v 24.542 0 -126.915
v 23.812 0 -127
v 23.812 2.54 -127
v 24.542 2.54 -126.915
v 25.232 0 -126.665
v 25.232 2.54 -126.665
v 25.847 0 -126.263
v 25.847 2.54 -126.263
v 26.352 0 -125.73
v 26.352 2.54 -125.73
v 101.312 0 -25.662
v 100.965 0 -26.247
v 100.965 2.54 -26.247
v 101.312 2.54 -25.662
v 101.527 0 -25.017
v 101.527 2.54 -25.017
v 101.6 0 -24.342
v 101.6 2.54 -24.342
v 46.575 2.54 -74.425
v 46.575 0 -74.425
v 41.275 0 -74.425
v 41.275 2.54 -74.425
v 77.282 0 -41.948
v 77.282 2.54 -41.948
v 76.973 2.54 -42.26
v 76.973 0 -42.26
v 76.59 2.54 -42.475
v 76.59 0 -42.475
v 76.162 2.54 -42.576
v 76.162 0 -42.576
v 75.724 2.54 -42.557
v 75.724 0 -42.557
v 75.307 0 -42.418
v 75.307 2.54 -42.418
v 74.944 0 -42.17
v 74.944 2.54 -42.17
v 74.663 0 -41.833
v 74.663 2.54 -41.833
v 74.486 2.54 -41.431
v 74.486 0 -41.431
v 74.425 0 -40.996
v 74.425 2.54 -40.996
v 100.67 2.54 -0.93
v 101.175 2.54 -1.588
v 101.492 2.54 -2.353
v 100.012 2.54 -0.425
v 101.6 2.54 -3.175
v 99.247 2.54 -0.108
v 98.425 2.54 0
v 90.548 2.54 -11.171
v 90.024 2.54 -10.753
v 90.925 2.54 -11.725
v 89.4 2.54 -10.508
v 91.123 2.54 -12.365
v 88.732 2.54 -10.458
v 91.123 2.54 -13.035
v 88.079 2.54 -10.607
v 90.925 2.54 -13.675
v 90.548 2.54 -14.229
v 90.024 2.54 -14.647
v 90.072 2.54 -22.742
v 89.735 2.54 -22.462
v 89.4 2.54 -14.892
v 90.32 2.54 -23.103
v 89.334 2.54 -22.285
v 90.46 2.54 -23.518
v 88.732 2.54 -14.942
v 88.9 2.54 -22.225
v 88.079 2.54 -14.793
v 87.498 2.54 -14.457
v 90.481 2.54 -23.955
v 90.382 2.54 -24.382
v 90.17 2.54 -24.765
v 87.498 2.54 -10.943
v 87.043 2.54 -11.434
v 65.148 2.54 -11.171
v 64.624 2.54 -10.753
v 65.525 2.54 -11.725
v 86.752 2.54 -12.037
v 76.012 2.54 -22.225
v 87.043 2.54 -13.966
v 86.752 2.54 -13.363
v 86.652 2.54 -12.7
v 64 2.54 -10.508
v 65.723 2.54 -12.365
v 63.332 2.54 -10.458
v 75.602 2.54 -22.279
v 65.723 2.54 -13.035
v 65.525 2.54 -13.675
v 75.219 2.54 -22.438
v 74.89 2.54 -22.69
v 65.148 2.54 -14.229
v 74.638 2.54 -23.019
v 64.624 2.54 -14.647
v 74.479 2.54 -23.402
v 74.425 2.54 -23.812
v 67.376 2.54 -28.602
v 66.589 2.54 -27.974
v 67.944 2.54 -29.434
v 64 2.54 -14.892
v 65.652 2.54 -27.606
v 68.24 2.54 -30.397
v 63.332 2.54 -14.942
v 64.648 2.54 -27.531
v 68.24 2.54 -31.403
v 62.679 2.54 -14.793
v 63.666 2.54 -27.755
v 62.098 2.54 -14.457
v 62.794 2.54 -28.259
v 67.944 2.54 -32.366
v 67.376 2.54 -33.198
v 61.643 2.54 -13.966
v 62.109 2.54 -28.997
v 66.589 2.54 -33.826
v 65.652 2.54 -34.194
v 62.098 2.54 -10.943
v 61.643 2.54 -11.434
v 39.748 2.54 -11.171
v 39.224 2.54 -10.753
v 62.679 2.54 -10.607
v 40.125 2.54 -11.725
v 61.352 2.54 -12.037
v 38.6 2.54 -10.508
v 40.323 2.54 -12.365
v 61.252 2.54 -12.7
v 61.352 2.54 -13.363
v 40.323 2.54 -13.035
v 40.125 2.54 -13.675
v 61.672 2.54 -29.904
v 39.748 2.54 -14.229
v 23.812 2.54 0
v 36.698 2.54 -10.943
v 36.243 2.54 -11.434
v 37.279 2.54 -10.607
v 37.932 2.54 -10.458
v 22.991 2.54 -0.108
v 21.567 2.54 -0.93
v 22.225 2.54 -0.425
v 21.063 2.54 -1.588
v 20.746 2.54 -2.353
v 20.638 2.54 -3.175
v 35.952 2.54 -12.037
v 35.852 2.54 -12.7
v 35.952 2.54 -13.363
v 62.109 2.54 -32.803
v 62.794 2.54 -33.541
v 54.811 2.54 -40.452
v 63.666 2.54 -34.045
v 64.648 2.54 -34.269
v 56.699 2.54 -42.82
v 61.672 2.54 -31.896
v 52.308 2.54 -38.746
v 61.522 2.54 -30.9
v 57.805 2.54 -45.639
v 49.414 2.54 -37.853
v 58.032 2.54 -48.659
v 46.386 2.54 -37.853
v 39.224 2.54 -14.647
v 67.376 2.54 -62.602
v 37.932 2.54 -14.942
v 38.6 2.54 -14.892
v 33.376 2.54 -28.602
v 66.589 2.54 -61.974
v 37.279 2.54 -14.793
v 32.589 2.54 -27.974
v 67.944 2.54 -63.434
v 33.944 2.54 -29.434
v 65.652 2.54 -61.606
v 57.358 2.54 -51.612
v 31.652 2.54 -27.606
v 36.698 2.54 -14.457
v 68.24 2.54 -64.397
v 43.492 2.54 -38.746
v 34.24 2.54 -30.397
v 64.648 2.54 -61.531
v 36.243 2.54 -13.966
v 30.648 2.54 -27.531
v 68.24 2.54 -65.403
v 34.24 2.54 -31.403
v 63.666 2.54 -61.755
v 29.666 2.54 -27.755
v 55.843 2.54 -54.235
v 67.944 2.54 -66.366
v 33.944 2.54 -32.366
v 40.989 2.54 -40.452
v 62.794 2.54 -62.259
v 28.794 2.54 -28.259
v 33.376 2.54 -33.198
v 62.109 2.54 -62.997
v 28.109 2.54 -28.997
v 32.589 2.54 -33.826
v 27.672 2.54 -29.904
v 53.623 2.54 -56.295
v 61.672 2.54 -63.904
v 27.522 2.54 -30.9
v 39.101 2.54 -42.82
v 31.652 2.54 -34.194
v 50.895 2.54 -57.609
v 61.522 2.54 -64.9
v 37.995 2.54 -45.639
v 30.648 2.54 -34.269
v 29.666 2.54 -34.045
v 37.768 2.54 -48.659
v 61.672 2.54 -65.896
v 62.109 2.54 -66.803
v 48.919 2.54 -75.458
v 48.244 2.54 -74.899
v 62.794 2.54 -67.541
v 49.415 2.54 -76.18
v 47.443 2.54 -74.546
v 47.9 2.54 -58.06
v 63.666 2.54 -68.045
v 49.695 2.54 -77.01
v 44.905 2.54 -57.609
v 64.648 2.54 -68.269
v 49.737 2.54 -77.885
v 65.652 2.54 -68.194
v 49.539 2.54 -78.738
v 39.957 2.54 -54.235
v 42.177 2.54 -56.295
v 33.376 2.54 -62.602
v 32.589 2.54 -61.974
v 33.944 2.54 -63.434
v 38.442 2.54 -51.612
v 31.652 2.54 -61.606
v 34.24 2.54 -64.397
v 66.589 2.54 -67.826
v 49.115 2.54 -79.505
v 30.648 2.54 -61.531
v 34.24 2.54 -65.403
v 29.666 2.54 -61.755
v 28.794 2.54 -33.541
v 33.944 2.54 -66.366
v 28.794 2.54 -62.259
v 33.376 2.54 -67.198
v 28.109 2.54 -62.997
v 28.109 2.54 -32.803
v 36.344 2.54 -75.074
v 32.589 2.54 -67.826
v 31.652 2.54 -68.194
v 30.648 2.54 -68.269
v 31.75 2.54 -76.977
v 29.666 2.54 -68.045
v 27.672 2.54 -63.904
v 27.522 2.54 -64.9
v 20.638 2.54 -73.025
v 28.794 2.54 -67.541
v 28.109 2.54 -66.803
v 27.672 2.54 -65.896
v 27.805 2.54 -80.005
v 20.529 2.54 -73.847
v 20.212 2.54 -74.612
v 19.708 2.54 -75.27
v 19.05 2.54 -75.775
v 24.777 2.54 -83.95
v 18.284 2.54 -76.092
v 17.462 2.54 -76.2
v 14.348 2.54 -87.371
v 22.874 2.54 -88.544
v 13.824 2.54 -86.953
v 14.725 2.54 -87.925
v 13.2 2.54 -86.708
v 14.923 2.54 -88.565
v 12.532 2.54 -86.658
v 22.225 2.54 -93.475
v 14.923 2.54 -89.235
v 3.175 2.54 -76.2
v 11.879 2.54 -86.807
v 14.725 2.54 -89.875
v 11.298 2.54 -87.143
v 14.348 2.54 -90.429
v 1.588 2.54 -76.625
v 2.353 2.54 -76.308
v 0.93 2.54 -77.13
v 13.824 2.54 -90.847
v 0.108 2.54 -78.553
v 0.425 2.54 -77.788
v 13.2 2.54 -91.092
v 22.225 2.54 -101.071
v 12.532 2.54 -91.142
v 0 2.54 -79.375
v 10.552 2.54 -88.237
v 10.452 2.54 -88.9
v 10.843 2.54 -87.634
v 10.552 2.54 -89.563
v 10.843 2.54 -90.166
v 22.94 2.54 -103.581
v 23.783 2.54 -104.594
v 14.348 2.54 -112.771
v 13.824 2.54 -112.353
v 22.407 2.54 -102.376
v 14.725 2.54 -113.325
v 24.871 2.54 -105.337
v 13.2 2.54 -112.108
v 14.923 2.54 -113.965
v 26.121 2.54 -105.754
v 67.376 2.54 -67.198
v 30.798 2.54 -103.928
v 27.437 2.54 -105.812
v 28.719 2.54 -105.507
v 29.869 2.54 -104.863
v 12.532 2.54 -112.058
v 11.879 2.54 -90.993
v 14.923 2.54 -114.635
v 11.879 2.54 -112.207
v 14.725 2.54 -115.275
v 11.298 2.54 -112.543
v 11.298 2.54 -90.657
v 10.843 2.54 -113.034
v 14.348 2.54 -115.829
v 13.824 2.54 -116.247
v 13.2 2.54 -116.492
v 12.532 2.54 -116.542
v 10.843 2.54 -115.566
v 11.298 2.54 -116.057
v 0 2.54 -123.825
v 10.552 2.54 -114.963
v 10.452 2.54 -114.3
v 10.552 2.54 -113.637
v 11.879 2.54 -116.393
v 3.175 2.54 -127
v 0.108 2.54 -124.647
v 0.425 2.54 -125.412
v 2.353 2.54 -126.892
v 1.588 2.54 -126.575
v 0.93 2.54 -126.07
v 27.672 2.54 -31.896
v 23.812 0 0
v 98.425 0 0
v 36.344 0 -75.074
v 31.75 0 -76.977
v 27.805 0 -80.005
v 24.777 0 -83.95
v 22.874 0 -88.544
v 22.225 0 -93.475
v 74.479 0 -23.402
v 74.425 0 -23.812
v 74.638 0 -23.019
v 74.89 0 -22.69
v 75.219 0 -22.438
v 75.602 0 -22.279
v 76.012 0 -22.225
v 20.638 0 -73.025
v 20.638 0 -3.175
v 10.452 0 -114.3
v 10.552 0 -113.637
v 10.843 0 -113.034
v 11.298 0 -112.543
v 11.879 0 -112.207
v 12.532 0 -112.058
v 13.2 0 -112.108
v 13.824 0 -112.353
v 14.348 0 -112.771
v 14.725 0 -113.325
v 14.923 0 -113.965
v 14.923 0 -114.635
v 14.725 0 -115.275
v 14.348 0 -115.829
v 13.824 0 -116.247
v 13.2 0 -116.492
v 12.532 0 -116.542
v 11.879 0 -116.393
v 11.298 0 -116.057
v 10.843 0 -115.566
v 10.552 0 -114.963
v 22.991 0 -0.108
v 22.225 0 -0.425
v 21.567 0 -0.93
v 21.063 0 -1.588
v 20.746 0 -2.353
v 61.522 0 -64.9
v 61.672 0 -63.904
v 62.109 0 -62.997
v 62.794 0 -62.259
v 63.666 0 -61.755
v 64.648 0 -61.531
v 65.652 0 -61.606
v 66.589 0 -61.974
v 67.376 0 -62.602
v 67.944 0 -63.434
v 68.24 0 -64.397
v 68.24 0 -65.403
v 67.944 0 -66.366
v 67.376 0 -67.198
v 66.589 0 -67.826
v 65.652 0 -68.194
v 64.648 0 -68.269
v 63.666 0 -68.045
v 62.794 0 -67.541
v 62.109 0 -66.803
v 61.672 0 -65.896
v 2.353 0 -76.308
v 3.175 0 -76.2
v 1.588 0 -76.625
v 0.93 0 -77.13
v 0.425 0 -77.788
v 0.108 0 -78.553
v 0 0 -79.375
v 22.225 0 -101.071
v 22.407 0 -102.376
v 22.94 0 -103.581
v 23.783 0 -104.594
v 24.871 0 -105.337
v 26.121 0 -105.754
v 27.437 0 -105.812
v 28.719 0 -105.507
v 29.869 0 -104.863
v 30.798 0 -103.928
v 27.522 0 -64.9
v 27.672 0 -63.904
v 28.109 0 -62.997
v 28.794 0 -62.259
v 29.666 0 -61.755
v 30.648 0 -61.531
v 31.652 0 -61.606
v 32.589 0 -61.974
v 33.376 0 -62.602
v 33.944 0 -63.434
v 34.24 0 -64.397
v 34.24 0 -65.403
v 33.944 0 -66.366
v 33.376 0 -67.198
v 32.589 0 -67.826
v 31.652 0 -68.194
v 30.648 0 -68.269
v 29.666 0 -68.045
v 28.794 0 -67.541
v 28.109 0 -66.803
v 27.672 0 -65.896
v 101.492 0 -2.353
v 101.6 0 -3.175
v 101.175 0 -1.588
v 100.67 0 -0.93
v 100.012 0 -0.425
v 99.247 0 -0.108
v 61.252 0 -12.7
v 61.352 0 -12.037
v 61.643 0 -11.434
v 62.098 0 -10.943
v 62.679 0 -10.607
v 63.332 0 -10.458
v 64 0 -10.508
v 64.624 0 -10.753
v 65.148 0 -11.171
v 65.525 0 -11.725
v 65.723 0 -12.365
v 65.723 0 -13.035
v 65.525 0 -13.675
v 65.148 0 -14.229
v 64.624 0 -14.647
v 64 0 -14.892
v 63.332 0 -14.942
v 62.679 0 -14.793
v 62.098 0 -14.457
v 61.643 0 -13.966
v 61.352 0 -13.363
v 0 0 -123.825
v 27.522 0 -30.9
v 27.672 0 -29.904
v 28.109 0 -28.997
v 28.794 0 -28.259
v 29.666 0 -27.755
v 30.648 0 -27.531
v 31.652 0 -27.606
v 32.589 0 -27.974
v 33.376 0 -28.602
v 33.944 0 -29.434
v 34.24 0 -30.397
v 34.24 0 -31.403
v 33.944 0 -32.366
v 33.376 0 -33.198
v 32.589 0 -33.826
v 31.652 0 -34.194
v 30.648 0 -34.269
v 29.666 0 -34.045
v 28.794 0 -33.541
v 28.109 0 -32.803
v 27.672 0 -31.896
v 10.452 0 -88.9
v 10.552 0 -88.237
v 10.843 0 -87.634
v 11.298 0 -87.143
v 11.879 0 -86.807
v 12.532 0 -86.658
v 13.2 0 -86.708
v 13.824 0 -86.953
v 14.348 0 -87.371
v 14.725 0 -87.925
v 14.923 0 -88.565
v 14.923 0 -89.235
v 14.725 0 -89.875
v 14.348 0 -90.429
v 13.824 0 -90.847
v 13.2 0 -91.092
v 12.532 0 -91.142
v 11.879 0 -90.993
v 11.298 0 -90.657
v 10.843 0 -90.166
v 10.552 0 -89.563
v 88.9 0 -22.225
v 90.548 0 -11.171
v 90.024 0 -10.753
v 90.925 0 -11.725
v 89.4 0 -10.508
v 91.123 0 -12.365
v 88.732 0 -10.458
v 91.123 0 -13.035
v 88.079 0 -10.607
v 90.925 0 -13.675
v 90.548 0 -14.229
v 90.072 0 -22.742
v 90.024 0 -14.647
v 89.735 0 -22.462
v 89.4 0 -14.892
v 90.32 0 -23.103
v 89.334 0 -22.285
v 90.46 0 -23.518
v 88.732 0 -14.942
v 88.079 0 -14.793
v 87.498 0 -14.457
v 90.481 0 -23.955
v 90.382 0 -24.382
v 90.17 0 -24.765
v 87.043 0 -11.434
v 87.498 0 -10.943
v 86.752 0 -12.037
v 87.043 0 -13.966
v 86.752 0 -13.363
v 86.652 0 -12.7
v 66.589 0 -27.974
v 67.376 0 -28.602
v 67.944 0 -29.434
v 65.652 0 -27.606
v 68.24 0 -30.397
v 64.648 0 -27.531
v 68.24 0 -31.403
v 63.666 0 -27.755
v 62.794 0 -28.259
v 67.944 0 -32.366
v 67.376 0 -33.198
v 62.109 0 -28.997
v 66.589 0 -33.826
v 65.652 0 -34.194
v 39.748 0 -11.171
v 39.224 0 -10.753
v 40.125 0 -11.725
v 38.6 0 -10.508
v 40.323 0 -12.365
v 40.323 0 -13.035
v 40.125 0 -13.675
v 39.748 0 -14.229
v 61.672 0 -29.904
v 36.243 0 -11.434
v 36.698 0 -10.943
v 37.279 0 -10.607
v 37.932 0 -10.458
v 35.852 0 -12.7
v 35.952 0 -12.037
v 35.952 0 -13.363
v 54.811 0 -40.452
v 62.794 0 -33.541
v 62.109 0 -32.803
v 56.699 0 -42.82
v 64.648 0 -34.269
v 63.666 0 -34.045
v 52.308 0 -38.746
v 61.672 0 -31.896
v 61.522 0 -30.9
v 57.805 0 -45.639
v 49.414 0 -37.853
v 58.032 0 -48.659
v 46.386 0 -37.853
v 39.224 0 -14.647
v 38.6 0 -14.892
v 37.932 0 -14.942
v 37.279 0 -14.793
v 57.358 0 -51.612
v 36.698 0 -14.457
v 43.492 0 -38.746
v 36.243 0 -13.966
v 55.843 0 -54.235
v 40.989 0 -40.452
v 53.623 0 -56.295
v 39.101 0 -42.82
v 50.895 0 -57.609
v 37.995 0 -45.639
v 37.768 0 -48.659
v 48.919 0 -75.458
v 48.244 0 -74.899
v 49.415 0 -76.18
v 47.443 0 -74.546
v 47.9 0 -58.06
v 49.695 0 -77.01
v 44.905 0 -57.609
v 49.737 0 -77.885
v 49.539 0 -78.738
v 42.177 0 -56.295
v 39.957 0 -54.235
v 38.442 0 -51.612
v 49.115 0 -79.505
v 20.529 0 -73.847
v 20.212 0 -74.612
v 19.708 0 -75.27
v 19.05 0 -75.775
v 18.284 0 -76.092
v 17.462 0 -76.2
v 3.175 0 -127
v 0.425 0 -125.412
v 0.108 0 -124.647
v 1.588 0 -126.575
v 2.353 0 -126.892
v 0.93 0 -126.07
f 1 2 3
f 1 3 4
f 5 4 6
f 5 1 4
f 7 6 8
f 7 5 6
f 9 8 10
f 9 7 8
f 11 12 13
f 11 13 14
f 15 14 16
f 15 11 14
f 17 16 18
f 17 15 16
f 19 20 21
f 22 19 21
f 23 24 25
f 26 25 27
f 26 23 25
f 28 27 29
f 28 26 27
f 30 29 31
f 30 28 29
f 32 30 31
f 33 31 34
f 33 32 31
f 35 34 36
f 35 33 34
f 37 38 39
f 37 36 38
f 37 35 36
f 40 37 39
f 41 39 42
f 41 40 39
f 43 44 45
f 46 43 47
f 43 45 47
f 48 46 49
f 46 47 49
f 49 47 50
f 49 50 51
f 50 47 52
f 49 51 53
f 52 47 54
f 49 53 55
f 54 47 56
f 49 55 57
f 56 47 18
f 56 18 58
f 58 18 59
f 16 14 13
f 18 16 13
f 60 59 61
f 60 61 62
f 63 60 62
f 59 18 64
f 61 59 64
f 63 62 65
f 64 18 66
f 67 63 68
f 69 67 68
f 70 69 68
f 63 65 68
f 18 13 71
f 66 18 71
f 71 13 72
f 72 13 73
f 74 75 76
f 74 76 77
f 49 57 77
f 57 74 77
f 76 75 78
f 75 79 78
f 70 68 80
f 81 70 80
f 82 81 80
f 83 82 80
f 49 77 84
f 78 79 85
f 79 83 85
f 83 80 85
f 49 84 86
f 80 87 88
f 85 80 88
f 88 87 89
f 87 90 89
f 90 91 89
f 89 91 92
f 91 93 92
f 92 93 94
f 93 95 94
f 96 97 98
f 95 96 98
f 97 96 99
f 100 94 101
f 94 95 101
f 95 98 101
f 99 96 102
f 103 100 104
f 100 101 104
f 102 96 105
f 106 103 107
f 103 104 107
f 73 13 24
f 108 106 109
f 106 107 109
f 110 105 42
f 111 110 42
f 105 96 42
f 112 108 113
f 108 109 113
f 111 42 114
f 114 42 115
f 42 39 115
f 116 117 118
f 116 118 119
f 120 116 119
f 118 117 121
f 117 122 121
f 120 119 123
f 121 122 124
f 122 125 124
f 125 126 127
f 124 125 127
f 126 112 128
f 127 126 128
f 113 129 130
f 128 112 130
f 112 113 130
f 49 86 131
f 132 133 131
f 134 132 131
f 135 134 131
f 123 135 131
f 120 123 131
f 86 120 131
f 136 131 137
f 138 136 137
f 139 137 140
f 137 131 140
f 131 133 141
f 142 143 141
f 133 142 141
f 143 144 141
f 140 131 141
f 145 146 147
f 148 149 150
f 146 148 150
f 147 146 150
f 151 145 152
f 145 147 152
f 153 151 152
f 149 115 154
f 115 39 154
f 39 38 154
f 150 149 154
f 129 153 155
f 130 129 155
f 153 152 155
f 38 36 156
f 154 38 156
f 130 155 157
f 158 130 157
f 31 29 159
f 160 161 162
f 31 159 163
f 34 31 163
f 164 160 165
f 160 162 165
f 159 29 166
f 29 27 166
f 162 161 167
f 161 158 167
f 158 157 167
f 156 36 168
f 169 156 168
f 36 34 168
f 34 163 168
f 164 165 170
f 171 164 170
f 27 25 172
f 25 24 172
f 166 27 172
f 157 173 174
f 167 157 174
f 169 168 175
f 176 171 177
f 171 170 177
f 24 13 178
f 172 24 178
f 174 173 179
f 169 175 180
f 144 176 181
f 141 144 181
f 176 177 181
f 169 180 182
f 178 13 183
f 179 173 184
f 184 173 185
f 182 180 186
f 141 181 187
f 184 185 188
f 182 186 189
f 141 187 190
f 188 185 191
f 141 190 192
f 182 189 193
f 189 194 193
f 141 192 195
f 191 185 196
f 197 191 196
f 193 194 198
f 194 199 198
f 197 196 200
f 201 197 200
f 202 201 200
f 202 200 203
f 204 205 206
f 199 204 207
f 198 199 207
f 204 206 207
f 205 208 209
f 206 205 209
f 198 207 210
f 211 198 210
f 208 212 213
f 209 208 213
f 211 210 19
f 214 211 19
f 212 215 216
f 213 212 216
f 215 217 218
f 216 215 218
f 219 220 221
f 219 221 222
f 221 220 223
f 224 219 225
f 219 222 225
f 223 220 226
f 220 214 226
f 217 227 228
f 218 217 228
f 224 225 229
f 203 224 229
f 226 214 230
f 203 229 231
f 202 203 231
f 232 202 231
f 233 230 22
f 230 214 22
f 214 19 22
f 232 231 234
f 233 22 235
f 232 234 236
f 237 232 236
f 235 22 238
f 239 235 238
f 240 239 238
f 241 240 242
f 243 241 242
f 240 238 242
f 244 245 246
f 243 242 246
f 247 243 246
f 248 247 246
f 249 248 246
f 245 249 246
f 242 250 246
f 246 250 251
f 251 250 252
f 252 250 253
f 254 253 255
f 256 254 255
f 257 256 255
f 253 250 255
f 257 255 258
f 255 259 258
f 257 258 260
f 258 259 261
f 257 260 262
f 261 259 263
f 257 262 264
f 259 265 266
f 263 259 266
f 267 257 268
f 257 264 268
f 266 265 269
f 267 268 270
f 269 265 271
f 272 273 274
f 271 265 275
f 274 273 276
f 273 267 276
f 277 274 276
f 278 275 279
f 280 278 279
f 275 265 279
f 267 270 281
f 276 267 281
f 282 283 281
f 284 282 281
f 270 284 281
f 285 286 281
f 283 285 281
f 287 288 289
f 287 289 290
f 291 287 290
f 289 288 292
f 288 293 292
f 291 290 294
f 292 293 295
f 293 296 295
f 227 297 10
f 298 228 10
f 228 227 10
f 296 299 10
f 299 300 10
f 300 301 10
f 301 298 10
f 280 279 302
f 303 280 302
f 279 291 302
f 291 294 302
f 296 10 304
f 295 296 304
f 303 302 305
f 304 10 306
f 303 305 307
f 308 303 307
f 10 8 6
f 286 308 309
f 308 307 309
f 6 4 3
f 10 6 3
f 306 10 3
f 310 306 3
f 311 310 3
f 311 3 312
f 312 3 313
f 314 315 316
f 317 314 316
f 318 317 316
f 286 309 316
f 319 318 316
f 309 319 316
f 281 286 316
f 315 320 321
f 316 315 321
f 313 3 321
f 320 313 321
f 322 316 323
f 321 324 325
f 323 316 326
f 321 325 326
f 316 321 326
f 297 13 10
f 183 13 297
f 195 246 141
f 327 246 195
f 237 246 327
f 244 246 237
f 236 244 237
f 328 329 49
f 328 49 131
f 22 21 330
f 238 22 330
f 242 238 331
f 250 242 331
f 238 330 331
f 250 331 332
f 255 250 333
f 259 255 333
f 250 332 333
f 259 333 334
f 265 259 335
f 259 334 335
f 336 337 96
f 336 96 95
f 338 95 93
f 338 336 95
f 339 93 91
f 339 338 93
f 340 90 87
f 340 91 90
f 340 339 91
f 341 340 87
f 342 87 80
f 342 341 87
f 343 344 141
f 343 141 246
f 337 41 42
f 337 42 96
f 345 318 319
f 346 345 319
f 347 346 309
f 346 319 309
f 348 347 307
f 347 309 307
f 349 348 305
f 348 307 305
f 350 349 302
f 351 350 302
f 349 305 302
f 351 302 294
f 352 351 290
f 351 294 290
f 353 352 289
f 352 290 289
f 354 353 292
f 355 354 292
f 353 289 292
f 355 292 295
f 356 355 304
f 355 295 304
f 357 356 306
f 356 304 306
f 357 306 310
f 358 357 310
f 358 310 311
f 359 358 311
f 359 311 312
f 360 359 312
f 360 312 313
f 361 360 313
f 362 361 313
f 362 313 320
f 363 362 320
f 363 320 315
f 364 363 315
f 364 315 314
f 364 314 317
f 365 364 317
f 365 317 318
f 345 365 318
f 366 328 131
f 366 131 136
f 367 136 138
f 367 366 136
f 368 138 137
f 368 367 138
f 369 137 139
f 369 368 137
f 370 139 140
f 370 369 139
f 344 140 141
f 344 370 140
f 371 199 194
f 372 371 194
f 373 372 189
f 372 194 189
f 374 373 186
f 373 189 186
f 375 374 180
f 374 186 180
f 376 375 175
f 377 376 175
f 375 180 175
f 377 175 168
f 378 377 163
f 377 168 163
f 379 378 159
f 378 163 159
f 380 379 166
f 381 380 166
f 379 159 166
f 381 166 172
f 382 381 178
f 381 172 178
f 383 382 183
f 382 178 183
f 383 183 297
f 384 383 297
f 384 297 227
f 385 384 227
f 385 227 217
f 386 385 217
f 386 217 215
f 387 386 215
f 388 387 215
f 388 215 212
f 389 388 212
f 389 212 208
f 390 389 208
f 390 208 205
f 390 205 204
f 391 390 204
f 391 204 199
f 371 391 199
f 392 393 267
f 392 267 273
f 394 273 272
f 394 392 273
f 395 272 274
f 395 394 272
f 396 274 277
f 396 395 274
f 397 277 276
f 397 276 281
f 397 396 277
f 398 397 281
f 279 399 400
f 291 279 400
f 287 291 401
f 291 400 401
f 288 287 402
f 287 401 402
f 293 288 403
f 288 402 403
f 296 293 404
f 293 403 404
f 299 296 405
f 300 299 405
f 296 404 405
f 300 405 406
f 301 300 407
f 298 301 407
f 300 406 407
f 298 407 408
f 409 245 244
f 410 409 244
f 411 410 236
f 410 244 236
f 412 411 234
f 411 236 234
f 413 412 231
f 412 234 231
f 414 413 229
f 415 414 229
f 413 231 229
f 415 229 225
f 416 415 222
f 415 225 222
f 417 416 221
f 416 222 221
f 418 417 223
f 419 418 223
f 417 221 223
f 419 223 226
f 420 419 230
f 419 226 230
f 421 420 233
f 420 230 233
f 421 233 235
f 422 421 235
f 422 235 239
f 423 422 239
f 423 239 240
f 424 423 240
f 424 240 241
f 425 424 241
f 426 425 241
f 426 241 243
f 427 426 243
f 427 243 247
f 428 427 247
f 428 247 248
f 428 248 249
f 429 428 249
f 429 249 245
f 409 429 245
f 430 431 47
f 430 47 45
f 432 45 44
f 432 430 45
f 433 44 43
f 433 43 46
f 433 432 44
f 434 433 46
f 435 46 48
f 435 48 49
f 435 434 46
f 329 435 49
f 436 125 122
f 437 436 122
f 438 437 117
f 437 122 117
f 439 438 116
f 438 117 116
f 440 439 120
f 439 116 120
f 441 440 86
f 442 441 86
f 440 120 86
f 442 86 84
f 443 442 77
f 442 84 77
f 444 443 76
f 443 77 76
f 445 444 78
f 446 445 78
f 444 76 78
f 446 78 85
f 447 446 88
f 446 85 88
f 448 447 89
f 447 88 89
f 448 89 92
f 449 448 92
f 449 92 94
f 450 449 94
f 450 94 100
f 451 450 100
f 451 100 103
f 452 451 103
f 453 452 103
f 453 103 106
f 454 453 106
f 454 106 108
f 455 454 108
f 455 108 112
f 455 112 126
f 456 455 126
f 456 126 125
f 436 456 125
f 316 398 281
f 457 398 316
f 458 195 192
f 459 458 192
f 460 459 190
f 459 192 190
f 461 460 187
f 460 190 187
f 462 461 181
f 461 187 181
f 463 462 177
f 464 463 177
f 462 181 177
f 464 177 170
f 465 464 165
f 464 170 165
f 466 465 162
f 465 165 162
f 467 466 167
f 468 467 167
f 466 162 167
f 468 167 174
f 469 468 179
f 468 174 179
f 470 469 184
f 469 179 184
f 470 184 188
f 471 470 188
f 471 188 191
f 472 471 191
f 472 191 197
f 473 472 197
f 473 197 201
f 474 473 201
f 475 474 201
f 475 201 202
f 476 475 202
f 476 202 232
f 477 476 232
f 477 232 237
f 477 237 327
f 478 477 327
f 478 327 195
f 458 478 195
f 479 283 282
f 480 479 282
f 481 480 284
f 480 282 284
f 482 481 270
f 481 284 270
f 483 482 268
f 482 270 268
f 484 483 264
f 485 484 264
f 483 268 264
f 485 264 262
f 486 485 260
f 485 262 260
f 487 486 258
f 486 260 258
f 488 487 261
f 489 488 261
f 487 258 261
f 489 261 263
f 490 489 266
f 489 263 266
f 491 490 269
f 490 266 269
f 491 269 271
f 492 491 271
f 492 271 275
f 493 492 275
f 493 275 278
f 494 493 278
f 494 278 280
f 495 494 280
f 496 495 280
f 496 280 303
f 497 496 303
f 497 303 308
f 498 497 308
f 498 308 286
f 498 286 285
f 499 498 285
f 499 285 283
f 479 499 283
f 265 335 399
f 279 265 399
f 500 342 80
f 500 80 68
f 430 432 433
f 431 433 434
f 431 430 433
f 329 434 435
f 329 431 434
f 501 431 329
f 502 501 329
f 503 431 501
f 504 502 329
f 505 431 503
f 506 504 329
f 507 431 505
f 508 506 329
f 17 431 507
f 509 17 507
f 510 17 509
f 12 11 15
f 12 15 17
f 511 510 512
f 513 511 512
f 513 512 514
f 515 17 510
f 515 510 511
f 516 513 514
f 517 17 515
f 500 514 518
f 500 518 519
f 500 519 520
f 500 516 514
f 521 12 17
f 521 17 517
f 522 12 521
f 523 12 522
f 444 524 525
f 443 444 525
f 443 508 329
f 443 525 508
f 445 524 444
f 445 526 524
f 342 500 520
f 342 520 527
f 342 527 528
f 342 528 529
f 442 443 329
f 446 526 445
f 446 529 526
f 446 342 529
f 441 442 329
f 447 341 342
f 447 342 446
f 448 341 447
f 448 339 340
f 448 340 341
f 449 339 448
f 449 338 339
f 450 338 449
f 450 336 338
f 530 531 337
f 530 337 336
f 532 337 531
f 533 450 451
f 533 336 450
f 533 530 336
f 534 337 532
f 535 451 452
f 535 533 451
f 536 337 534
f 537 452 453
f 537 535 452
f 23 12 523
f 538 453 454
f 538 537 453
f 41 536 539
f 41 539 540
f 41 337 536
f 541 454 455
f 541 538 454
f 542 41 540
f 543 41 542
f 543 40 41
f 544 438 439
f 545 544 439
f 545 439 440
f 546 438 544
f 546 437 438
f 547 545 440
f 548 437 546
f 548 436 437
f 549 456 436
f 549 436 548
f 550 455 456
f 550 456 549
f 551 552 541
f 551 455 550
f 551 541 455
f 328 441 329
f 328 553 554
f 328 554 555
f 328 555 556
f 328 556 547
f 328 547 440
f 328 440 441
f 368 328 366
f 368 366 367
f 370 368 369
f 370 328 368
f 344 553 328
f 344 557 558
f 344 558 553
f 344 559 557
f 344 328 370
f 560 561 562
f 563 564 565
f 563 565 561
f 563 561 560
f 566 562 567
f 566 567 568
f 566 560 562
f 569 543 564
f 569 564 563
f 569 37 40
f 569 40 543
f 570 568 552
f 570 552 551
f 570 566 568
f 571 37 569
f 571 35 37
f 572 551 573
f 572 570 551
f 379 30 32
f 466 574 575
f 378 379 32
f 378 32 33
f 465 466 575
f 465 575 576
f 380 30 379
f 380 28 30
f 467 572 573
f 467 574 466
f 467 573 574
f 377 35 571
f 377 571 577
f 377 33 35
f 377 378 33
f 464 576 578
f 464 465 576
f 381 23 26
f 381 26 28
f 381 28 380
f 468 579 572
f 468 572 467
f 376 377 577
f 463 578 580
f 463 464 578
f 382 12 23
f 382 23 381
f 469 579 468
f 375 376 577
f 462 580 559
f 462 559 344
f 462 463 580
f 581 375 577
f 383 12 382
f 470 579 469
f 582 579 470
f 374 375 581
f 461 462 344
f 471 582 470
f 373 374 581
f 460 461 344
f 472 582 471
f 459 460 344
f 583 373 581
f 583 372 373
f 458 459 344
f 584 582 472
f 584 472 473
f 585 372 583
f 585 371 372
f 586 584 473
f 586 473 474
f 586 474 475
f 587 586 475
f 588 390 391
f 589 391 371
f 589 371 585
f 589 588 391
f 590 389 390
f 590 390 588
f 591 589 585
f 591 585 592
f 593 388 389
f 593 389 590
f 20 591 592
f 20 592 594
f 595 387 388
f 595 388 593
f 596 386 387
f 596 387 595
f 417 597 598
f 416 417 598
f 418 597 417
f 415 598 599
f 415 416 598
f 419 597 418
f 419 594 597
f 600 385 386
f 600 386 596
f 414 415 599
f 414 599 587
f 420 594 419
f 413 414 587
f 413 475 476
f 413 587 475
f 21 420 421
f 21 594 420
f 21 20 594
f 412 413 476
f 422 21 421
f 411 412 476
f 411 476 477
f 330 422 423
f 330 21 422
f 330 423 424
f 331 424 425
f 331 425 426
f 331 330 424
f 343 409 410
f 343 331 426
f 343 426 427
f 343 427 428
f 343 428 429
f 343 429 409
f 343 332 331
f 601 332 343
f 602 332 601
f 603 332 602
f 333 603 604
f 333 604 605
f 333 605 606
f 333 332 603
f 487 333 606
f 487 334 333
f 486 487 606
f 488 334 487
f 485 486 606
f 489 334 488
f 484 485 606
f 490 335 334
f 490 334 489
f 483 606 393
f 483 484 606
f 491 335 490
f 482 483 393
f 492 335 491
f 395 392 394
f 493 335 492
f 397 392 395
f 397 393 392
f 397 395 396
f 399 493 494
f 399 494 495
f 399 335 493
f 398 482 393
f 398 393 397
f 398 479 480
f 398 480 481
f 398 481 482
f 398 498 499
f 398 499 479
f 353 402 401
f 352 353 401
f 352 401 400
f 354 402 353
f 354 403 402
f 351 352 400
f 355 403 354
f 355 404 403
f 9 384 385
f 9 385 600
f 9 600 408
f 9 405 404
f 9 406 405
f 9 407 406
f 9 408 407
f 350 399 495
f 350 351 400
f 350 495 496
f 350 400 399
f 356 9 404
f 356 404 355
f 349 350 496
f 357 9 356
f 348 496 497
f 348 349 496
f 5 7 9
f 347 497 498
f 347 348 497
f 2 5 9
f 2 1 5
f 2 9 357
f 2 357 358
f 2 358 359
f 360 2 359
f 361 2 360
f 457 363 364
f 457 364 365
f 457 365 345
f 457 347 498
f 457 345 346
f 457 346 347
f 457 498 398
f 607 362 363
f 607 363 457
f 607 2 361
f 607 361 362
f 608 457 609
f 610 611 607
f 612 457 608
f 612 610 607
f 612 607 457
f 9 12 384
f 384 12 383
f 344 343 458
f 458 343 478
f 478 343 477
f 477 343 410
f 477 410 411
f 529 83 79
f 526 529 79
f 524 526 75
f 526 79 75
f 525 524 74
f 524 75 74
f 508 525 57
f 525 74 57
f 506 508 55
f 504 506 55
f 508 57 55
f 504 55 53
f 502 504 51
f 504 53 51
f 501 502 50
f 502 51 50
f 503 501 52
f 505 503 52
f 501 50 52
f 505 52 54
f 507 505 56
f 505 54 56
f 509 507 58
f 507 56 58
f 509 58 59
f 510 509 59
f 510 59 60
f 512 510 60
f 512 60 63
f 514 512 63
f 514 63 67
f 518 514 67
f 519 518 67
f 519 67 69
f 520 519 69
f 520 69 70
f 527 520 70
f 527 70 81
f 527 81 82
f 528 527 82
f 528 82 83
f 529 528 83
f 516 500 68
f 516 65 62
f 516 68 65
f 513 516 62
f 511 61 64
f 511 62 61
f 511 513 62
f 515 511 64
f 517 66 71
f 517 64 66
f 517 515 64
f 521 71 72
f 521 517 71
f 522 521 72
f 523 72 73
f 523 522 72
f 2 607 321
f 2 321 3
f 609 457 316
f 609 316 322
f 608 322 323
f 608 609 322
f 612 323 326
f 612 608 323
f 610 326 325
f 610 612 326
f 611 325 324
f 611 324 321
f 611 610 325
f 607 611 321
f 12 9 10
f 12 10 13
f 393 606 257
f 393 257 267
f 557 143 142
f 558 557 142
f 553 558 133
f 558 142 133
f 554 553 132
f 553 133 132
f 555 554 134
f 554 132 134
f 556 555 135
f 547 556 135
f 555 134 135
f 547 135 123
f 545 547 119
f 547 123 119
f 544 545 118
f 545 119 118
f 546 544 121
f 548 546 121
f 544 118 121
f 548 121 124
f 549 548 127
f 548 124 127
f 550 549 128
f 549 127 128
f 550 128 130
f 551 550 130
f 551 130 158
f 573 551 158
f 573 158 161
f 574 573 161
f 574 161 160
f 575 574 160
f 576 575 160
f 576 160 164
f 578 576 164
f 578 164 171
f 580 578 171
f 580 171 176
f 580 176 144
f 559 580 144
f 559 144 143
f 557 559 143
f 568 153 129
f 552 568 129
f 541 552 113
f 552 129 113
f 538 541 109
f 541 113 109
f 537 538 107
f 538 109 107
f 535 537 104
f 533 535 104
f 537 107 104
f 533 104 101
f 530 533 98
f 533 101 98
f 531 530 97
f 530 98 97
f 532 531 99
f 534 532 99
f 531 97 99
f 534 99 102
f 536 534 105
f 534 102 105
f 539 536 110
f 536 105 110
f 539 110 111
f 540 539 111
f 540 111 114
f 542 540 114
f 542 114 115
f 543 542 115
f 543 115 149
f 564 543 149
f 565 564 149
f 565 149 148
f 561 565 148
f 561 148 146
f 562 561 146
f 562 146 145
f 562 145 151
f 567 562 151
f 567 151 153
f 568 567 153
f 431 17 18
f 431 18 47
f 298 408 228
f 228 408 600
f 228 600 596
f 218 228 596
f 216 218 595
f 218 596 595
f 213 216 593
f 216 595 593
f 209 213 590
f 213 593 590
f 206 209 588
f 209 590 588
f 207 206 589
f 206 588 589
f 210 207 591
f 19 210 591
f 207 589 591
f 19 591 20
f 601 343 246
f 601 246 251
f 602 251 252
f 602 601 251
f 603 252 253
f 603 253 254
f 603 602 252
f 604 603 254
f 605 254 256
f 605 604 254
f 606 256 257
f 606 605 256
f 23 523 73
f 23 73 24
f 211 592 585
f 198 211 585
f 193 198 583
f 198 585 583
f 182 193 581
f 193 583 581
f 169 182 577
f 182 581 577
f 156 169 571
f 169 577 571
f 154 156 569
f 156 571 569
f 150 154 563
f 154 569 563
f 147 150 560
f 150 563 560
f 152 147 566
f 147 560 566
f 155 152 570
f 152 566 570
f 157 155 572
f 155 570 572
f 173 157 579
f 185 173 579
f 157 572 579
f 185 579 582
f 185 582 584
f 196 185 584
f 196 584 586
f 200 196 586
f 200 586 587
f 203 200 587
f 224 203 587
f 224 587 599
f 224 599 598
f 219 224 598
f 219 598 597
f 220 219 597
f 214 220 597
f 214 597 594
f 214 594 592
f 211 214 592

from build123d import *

# Parameters (mm, degrees)
BOSS_EXTRUDE1_DEPTH     = 2.54
F_8_CLEARANCE_HOLE1_D   = 4.4958
F_1_4_CLEARANCE_HOLE1_D = 6.7564
SKETCH6_R               = 10.16
CUT_EXTRUDE1_DEPTH      = 163.659188489


with BuildPart() as part:
    # Sketch1 → Boss-Extrude1 (new body)
    with BuildSketch(Plane(origin=(0, 0, 0), x_dir=(1, 0, 0), z_dir=(0, 1, 0))):
        with BuildLine():
            Line((26.3525, 125.73), (100.965, 26.246666667))
            ThreePointArc((100.965, 26.246666667), (101.437069471, 25.345689824), (101.6, 24.341666667))
            Line((101.6, 24.341666667), (101.6, 3.175))
            ThreePointArc((101.6, 3.175), (100.67006403, 0.92993597), (98.425, 0))
            Line((98.425, 0), (23.8125, 0))
            ThreePointArc((23.8125, 0), (21.56743597, 0.92993597), (20.6375, 3.175))
            Line((20.6375, 3.175), (20.6375, 73.025))
            ThreePointArc((20.6375, 73.025), (19.70756403, 75.27006403), (17.4625, 76.2))
            Line((17.4625, 76.2), (3.175, 76.2))
            ThreePointArc((3.175, 76.2), (0.92993597, 77.12993597), (0, 79.375))
            Line((0, 79.375), (0, 123.825))
            ThreePointArc((0, 123.825), (0.92993597, 126.07006403), (3.175, 127))
            Line((3.175, 127), (23.8125, 127))
            ThreePointArc((23.8125, 127), (25.232403166, 126.664806331), (26.3525, 125.73))
        make_face()
    extrude(amount=BOSS_EXTRUDE1_DEPTH)

    # #8 Clearance Hole1 (through all)
    with Locations(Plane.XZ):
        with Locations((38.1, -12.7), (63.5, -12.7), (88.9, -12.7), (12.7, -88.9), (12.7, -114.3)):
            Hole(F_8_CLEARANCE_HOLE1_D / 2)

    # 1/4 Clearance Hole1 (through all)
    with Locations(Plane.XZ):
        with Locations((30.9, -64.9), (30.9, -30.9), (64.9, -30.9), (64.9, -64.9)):
            Hole(F_1_4_CLEARANCE_HOLE1_D / 2)

    # Sketch6 → Cut-Extrude1 (cut, through all)
    with BuildSketch(Plane.XZ):
        with Locations(Location((47.9, -47.9, 0), (0, 0, 270))):
            Circle(SKETCH6_R)
        with BuildLine():
            Line((76.0125, -22.225), (88.9, -22.225))
            ThreePointArc((88.9, -22.225), (90.319903166, -23.102548417), (90.17, -24.765))
            Line((90.17, -24.765), (77.2825, -41.948333333))
            ThreePointArc((77.2825, -41.948333333), (75.510488421, -42.501868069), (74.425, -40.995833333))
            Line((74.425, -40.995833333), (74.425, -23.8125))
            ThreePointArc((74.425, -23.8125), (74.889967985, -22.689967985), (76.0125, -22.225))
        make_face()
        with BuildLine():
            Line((30.7975, -103.928333333), (49.115, -79.505))
            ThreePointArc((49.115, -79.505), (49.414806331, -76.180096834), (46.575, -74.425))
            Line((46.575, -74.425), (41.275, -74.425))
            ThreePointArc((41.275, -74.425), (27.804615818, -80.004615818), (22.225, -93.475))
            Line((22.225, -93.475), (22.225, -101.070833333))
            ThreePointArc((22.225, -101.070833333), (25.481465264, -105.58893754), (30.7975, -103.928333333))
        make_face()
    extrude(amount=-CUT_EXTRUDE1_DEPTH, mode=Mode.SUBTRACT)


solid = part.part
